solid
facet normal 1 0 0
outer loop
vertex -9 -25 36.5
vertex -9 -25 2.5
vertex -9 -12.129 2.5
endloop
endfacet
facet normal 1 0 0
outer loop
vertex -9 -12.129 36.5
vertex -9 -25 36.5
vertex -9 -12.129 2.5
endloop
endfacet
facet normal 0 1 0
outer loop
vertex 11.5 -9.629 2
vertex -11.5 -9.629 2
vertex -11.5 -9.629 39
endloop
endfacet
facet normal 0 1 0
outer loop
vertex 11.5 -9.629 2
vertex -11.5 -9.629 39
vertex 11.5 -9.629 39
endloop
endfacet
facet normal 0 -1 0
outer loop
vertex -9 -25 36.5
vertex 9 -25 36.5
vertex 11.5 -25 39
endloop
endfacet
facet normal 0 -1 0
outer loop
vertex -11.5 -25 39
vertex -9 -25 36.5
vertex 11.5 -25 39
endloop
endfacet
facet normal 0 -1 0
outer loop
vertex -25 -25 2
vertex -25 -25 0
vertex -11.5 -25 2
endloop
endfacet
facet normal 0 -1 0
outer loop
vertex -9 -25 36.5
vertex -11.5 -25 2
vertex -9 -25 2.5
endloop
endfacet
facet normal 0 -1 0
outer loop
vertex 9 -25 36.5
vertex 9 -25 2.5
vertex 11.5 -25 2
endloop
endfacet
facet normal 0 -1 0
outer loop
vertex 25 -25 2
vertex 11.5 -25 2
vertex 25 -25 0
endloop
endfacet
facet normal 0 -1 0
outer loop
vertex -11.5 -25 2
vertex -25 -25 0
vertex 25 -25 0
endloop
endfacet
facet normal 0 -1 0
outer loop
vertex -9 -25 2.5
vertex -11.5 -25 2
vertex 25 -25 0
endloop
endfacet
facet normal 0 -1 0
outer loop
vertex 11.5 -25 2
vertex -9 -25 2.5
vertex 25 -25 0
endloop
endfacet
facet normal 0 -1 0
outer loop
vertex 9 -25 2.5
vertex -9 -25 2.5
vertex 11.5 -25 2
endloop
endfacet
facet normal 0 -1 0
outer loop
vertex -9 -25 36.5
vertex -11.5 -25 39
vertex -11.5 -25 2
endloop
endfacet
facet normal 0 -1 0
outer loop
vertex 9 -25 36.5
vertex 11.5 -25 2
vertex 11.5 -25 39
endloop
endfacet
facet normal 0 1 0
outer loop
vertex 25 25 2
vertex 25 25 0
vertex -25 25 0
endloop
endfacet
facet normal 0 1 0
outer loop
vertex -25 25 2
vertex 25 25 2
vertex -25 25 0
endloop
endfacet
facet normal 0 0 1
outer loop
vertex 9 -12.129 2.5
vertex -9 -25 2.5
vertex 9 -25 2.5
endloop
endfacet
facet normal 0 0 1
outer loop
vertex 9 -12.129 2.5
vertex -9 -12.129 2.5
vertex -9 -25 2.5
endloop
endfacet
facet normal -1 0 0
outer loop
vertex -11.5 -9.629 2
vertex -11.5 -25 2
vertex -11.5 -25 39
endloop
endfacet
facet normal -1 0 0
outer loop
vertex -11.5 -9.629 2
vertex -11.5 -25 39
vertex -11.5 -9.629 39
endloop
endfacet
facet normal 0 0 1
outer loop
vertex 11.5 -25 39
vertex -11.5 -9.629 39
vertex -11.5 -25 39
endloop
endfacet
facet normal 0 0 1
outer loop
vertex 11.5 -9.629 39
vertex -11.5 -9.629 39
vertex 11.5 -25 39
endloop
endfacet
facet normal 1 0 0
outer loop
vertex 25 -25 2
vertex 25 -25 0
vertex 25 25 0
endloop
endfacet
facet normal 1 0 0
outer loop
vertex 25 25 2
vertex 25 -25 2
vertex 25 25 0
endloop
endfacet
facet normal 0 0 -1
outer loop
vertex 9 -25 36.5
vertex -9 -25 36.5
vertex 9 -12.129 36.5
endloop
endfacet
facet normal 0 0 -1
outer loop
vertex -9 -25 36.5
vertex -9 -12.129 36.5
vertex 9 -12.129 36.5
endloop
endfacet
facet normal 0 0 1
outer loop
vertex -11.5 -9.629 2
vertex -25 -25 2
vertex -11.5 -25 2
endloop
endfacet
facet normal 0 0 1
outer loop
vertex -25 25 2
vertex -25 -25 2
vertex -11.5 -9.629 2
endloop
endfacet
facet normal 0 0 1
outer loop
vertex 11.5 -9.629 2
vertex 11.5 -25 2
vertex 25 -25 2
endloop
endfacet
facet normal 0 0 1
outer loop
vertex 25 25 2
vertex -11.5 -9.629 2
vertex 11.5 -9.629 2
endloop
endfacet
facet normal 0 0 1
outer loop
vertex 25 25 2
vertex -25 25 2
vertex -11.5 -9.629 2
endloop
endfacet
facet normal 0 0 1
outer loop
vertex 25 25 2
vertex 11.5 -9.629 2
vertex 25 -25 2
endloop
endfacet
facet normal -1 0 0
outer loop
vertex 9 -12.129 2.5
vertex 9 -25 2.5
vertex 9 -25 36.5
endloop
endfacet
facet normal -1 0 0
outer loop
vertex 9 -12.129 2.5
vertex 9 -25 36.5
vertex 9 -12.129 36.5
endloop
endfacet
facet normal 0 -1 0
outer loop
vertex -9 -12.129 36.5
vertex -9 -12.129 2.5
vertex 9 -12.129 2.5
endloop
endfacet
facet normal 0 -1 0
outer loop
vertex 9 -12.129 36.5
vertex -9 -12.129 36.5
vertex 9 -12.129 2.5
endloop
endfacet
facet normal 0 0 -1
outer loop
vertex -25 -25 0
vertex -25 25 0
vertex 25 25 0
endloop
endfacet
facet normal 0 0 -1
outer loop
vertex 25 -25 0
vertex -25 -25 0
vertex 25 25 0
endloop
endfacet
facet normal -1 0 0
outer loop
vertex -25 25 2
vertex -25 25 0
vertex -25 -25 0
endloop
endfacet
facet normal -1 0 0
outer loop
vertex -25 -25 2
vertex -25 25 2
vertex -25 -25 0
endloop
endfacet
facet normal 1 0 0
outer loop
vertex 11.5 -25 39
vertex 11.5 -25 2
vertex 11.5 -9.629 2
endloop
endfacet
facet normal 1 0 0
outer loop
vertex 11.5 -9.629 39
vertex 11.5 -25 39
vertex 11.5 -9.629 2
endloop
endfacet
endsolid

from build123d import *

# Parameters (mm, degrees)
F0_W     = 23
F0_H     = 15.370602
F1_DEPTH = 39
F2_DEPTH = 2
F3_T     = -2.5


with BuildPart() as f1:
    # F0 (on Top) → F1 (new body)
    with BuildSketch(Plane.XY):
        with Locations((0, -17.314699)):
            Rectangle(F0_W, F0_H)
    extrude(amount=F1_DEPTH)

    # F0 (on Top) → F2 (join)
    with BuildSketch(Plane.XY):
        Polygon((25, 25), (-25, 25), (-25, -25), (-11.5, -25), (-11.5, -9.629398), (11.5, -9.629398), (11.5, -25), (25, -25), align=None)
    extrude(amount=F2_DEPTH)

    # F3
    f3_openings = [f1.faces().sort_by_distance(p)[0] for p in [
        (0, -25, 18.449527),
    ]]
    offset(amount=F3_T, openings=f3_openings)


solid = f1.part
